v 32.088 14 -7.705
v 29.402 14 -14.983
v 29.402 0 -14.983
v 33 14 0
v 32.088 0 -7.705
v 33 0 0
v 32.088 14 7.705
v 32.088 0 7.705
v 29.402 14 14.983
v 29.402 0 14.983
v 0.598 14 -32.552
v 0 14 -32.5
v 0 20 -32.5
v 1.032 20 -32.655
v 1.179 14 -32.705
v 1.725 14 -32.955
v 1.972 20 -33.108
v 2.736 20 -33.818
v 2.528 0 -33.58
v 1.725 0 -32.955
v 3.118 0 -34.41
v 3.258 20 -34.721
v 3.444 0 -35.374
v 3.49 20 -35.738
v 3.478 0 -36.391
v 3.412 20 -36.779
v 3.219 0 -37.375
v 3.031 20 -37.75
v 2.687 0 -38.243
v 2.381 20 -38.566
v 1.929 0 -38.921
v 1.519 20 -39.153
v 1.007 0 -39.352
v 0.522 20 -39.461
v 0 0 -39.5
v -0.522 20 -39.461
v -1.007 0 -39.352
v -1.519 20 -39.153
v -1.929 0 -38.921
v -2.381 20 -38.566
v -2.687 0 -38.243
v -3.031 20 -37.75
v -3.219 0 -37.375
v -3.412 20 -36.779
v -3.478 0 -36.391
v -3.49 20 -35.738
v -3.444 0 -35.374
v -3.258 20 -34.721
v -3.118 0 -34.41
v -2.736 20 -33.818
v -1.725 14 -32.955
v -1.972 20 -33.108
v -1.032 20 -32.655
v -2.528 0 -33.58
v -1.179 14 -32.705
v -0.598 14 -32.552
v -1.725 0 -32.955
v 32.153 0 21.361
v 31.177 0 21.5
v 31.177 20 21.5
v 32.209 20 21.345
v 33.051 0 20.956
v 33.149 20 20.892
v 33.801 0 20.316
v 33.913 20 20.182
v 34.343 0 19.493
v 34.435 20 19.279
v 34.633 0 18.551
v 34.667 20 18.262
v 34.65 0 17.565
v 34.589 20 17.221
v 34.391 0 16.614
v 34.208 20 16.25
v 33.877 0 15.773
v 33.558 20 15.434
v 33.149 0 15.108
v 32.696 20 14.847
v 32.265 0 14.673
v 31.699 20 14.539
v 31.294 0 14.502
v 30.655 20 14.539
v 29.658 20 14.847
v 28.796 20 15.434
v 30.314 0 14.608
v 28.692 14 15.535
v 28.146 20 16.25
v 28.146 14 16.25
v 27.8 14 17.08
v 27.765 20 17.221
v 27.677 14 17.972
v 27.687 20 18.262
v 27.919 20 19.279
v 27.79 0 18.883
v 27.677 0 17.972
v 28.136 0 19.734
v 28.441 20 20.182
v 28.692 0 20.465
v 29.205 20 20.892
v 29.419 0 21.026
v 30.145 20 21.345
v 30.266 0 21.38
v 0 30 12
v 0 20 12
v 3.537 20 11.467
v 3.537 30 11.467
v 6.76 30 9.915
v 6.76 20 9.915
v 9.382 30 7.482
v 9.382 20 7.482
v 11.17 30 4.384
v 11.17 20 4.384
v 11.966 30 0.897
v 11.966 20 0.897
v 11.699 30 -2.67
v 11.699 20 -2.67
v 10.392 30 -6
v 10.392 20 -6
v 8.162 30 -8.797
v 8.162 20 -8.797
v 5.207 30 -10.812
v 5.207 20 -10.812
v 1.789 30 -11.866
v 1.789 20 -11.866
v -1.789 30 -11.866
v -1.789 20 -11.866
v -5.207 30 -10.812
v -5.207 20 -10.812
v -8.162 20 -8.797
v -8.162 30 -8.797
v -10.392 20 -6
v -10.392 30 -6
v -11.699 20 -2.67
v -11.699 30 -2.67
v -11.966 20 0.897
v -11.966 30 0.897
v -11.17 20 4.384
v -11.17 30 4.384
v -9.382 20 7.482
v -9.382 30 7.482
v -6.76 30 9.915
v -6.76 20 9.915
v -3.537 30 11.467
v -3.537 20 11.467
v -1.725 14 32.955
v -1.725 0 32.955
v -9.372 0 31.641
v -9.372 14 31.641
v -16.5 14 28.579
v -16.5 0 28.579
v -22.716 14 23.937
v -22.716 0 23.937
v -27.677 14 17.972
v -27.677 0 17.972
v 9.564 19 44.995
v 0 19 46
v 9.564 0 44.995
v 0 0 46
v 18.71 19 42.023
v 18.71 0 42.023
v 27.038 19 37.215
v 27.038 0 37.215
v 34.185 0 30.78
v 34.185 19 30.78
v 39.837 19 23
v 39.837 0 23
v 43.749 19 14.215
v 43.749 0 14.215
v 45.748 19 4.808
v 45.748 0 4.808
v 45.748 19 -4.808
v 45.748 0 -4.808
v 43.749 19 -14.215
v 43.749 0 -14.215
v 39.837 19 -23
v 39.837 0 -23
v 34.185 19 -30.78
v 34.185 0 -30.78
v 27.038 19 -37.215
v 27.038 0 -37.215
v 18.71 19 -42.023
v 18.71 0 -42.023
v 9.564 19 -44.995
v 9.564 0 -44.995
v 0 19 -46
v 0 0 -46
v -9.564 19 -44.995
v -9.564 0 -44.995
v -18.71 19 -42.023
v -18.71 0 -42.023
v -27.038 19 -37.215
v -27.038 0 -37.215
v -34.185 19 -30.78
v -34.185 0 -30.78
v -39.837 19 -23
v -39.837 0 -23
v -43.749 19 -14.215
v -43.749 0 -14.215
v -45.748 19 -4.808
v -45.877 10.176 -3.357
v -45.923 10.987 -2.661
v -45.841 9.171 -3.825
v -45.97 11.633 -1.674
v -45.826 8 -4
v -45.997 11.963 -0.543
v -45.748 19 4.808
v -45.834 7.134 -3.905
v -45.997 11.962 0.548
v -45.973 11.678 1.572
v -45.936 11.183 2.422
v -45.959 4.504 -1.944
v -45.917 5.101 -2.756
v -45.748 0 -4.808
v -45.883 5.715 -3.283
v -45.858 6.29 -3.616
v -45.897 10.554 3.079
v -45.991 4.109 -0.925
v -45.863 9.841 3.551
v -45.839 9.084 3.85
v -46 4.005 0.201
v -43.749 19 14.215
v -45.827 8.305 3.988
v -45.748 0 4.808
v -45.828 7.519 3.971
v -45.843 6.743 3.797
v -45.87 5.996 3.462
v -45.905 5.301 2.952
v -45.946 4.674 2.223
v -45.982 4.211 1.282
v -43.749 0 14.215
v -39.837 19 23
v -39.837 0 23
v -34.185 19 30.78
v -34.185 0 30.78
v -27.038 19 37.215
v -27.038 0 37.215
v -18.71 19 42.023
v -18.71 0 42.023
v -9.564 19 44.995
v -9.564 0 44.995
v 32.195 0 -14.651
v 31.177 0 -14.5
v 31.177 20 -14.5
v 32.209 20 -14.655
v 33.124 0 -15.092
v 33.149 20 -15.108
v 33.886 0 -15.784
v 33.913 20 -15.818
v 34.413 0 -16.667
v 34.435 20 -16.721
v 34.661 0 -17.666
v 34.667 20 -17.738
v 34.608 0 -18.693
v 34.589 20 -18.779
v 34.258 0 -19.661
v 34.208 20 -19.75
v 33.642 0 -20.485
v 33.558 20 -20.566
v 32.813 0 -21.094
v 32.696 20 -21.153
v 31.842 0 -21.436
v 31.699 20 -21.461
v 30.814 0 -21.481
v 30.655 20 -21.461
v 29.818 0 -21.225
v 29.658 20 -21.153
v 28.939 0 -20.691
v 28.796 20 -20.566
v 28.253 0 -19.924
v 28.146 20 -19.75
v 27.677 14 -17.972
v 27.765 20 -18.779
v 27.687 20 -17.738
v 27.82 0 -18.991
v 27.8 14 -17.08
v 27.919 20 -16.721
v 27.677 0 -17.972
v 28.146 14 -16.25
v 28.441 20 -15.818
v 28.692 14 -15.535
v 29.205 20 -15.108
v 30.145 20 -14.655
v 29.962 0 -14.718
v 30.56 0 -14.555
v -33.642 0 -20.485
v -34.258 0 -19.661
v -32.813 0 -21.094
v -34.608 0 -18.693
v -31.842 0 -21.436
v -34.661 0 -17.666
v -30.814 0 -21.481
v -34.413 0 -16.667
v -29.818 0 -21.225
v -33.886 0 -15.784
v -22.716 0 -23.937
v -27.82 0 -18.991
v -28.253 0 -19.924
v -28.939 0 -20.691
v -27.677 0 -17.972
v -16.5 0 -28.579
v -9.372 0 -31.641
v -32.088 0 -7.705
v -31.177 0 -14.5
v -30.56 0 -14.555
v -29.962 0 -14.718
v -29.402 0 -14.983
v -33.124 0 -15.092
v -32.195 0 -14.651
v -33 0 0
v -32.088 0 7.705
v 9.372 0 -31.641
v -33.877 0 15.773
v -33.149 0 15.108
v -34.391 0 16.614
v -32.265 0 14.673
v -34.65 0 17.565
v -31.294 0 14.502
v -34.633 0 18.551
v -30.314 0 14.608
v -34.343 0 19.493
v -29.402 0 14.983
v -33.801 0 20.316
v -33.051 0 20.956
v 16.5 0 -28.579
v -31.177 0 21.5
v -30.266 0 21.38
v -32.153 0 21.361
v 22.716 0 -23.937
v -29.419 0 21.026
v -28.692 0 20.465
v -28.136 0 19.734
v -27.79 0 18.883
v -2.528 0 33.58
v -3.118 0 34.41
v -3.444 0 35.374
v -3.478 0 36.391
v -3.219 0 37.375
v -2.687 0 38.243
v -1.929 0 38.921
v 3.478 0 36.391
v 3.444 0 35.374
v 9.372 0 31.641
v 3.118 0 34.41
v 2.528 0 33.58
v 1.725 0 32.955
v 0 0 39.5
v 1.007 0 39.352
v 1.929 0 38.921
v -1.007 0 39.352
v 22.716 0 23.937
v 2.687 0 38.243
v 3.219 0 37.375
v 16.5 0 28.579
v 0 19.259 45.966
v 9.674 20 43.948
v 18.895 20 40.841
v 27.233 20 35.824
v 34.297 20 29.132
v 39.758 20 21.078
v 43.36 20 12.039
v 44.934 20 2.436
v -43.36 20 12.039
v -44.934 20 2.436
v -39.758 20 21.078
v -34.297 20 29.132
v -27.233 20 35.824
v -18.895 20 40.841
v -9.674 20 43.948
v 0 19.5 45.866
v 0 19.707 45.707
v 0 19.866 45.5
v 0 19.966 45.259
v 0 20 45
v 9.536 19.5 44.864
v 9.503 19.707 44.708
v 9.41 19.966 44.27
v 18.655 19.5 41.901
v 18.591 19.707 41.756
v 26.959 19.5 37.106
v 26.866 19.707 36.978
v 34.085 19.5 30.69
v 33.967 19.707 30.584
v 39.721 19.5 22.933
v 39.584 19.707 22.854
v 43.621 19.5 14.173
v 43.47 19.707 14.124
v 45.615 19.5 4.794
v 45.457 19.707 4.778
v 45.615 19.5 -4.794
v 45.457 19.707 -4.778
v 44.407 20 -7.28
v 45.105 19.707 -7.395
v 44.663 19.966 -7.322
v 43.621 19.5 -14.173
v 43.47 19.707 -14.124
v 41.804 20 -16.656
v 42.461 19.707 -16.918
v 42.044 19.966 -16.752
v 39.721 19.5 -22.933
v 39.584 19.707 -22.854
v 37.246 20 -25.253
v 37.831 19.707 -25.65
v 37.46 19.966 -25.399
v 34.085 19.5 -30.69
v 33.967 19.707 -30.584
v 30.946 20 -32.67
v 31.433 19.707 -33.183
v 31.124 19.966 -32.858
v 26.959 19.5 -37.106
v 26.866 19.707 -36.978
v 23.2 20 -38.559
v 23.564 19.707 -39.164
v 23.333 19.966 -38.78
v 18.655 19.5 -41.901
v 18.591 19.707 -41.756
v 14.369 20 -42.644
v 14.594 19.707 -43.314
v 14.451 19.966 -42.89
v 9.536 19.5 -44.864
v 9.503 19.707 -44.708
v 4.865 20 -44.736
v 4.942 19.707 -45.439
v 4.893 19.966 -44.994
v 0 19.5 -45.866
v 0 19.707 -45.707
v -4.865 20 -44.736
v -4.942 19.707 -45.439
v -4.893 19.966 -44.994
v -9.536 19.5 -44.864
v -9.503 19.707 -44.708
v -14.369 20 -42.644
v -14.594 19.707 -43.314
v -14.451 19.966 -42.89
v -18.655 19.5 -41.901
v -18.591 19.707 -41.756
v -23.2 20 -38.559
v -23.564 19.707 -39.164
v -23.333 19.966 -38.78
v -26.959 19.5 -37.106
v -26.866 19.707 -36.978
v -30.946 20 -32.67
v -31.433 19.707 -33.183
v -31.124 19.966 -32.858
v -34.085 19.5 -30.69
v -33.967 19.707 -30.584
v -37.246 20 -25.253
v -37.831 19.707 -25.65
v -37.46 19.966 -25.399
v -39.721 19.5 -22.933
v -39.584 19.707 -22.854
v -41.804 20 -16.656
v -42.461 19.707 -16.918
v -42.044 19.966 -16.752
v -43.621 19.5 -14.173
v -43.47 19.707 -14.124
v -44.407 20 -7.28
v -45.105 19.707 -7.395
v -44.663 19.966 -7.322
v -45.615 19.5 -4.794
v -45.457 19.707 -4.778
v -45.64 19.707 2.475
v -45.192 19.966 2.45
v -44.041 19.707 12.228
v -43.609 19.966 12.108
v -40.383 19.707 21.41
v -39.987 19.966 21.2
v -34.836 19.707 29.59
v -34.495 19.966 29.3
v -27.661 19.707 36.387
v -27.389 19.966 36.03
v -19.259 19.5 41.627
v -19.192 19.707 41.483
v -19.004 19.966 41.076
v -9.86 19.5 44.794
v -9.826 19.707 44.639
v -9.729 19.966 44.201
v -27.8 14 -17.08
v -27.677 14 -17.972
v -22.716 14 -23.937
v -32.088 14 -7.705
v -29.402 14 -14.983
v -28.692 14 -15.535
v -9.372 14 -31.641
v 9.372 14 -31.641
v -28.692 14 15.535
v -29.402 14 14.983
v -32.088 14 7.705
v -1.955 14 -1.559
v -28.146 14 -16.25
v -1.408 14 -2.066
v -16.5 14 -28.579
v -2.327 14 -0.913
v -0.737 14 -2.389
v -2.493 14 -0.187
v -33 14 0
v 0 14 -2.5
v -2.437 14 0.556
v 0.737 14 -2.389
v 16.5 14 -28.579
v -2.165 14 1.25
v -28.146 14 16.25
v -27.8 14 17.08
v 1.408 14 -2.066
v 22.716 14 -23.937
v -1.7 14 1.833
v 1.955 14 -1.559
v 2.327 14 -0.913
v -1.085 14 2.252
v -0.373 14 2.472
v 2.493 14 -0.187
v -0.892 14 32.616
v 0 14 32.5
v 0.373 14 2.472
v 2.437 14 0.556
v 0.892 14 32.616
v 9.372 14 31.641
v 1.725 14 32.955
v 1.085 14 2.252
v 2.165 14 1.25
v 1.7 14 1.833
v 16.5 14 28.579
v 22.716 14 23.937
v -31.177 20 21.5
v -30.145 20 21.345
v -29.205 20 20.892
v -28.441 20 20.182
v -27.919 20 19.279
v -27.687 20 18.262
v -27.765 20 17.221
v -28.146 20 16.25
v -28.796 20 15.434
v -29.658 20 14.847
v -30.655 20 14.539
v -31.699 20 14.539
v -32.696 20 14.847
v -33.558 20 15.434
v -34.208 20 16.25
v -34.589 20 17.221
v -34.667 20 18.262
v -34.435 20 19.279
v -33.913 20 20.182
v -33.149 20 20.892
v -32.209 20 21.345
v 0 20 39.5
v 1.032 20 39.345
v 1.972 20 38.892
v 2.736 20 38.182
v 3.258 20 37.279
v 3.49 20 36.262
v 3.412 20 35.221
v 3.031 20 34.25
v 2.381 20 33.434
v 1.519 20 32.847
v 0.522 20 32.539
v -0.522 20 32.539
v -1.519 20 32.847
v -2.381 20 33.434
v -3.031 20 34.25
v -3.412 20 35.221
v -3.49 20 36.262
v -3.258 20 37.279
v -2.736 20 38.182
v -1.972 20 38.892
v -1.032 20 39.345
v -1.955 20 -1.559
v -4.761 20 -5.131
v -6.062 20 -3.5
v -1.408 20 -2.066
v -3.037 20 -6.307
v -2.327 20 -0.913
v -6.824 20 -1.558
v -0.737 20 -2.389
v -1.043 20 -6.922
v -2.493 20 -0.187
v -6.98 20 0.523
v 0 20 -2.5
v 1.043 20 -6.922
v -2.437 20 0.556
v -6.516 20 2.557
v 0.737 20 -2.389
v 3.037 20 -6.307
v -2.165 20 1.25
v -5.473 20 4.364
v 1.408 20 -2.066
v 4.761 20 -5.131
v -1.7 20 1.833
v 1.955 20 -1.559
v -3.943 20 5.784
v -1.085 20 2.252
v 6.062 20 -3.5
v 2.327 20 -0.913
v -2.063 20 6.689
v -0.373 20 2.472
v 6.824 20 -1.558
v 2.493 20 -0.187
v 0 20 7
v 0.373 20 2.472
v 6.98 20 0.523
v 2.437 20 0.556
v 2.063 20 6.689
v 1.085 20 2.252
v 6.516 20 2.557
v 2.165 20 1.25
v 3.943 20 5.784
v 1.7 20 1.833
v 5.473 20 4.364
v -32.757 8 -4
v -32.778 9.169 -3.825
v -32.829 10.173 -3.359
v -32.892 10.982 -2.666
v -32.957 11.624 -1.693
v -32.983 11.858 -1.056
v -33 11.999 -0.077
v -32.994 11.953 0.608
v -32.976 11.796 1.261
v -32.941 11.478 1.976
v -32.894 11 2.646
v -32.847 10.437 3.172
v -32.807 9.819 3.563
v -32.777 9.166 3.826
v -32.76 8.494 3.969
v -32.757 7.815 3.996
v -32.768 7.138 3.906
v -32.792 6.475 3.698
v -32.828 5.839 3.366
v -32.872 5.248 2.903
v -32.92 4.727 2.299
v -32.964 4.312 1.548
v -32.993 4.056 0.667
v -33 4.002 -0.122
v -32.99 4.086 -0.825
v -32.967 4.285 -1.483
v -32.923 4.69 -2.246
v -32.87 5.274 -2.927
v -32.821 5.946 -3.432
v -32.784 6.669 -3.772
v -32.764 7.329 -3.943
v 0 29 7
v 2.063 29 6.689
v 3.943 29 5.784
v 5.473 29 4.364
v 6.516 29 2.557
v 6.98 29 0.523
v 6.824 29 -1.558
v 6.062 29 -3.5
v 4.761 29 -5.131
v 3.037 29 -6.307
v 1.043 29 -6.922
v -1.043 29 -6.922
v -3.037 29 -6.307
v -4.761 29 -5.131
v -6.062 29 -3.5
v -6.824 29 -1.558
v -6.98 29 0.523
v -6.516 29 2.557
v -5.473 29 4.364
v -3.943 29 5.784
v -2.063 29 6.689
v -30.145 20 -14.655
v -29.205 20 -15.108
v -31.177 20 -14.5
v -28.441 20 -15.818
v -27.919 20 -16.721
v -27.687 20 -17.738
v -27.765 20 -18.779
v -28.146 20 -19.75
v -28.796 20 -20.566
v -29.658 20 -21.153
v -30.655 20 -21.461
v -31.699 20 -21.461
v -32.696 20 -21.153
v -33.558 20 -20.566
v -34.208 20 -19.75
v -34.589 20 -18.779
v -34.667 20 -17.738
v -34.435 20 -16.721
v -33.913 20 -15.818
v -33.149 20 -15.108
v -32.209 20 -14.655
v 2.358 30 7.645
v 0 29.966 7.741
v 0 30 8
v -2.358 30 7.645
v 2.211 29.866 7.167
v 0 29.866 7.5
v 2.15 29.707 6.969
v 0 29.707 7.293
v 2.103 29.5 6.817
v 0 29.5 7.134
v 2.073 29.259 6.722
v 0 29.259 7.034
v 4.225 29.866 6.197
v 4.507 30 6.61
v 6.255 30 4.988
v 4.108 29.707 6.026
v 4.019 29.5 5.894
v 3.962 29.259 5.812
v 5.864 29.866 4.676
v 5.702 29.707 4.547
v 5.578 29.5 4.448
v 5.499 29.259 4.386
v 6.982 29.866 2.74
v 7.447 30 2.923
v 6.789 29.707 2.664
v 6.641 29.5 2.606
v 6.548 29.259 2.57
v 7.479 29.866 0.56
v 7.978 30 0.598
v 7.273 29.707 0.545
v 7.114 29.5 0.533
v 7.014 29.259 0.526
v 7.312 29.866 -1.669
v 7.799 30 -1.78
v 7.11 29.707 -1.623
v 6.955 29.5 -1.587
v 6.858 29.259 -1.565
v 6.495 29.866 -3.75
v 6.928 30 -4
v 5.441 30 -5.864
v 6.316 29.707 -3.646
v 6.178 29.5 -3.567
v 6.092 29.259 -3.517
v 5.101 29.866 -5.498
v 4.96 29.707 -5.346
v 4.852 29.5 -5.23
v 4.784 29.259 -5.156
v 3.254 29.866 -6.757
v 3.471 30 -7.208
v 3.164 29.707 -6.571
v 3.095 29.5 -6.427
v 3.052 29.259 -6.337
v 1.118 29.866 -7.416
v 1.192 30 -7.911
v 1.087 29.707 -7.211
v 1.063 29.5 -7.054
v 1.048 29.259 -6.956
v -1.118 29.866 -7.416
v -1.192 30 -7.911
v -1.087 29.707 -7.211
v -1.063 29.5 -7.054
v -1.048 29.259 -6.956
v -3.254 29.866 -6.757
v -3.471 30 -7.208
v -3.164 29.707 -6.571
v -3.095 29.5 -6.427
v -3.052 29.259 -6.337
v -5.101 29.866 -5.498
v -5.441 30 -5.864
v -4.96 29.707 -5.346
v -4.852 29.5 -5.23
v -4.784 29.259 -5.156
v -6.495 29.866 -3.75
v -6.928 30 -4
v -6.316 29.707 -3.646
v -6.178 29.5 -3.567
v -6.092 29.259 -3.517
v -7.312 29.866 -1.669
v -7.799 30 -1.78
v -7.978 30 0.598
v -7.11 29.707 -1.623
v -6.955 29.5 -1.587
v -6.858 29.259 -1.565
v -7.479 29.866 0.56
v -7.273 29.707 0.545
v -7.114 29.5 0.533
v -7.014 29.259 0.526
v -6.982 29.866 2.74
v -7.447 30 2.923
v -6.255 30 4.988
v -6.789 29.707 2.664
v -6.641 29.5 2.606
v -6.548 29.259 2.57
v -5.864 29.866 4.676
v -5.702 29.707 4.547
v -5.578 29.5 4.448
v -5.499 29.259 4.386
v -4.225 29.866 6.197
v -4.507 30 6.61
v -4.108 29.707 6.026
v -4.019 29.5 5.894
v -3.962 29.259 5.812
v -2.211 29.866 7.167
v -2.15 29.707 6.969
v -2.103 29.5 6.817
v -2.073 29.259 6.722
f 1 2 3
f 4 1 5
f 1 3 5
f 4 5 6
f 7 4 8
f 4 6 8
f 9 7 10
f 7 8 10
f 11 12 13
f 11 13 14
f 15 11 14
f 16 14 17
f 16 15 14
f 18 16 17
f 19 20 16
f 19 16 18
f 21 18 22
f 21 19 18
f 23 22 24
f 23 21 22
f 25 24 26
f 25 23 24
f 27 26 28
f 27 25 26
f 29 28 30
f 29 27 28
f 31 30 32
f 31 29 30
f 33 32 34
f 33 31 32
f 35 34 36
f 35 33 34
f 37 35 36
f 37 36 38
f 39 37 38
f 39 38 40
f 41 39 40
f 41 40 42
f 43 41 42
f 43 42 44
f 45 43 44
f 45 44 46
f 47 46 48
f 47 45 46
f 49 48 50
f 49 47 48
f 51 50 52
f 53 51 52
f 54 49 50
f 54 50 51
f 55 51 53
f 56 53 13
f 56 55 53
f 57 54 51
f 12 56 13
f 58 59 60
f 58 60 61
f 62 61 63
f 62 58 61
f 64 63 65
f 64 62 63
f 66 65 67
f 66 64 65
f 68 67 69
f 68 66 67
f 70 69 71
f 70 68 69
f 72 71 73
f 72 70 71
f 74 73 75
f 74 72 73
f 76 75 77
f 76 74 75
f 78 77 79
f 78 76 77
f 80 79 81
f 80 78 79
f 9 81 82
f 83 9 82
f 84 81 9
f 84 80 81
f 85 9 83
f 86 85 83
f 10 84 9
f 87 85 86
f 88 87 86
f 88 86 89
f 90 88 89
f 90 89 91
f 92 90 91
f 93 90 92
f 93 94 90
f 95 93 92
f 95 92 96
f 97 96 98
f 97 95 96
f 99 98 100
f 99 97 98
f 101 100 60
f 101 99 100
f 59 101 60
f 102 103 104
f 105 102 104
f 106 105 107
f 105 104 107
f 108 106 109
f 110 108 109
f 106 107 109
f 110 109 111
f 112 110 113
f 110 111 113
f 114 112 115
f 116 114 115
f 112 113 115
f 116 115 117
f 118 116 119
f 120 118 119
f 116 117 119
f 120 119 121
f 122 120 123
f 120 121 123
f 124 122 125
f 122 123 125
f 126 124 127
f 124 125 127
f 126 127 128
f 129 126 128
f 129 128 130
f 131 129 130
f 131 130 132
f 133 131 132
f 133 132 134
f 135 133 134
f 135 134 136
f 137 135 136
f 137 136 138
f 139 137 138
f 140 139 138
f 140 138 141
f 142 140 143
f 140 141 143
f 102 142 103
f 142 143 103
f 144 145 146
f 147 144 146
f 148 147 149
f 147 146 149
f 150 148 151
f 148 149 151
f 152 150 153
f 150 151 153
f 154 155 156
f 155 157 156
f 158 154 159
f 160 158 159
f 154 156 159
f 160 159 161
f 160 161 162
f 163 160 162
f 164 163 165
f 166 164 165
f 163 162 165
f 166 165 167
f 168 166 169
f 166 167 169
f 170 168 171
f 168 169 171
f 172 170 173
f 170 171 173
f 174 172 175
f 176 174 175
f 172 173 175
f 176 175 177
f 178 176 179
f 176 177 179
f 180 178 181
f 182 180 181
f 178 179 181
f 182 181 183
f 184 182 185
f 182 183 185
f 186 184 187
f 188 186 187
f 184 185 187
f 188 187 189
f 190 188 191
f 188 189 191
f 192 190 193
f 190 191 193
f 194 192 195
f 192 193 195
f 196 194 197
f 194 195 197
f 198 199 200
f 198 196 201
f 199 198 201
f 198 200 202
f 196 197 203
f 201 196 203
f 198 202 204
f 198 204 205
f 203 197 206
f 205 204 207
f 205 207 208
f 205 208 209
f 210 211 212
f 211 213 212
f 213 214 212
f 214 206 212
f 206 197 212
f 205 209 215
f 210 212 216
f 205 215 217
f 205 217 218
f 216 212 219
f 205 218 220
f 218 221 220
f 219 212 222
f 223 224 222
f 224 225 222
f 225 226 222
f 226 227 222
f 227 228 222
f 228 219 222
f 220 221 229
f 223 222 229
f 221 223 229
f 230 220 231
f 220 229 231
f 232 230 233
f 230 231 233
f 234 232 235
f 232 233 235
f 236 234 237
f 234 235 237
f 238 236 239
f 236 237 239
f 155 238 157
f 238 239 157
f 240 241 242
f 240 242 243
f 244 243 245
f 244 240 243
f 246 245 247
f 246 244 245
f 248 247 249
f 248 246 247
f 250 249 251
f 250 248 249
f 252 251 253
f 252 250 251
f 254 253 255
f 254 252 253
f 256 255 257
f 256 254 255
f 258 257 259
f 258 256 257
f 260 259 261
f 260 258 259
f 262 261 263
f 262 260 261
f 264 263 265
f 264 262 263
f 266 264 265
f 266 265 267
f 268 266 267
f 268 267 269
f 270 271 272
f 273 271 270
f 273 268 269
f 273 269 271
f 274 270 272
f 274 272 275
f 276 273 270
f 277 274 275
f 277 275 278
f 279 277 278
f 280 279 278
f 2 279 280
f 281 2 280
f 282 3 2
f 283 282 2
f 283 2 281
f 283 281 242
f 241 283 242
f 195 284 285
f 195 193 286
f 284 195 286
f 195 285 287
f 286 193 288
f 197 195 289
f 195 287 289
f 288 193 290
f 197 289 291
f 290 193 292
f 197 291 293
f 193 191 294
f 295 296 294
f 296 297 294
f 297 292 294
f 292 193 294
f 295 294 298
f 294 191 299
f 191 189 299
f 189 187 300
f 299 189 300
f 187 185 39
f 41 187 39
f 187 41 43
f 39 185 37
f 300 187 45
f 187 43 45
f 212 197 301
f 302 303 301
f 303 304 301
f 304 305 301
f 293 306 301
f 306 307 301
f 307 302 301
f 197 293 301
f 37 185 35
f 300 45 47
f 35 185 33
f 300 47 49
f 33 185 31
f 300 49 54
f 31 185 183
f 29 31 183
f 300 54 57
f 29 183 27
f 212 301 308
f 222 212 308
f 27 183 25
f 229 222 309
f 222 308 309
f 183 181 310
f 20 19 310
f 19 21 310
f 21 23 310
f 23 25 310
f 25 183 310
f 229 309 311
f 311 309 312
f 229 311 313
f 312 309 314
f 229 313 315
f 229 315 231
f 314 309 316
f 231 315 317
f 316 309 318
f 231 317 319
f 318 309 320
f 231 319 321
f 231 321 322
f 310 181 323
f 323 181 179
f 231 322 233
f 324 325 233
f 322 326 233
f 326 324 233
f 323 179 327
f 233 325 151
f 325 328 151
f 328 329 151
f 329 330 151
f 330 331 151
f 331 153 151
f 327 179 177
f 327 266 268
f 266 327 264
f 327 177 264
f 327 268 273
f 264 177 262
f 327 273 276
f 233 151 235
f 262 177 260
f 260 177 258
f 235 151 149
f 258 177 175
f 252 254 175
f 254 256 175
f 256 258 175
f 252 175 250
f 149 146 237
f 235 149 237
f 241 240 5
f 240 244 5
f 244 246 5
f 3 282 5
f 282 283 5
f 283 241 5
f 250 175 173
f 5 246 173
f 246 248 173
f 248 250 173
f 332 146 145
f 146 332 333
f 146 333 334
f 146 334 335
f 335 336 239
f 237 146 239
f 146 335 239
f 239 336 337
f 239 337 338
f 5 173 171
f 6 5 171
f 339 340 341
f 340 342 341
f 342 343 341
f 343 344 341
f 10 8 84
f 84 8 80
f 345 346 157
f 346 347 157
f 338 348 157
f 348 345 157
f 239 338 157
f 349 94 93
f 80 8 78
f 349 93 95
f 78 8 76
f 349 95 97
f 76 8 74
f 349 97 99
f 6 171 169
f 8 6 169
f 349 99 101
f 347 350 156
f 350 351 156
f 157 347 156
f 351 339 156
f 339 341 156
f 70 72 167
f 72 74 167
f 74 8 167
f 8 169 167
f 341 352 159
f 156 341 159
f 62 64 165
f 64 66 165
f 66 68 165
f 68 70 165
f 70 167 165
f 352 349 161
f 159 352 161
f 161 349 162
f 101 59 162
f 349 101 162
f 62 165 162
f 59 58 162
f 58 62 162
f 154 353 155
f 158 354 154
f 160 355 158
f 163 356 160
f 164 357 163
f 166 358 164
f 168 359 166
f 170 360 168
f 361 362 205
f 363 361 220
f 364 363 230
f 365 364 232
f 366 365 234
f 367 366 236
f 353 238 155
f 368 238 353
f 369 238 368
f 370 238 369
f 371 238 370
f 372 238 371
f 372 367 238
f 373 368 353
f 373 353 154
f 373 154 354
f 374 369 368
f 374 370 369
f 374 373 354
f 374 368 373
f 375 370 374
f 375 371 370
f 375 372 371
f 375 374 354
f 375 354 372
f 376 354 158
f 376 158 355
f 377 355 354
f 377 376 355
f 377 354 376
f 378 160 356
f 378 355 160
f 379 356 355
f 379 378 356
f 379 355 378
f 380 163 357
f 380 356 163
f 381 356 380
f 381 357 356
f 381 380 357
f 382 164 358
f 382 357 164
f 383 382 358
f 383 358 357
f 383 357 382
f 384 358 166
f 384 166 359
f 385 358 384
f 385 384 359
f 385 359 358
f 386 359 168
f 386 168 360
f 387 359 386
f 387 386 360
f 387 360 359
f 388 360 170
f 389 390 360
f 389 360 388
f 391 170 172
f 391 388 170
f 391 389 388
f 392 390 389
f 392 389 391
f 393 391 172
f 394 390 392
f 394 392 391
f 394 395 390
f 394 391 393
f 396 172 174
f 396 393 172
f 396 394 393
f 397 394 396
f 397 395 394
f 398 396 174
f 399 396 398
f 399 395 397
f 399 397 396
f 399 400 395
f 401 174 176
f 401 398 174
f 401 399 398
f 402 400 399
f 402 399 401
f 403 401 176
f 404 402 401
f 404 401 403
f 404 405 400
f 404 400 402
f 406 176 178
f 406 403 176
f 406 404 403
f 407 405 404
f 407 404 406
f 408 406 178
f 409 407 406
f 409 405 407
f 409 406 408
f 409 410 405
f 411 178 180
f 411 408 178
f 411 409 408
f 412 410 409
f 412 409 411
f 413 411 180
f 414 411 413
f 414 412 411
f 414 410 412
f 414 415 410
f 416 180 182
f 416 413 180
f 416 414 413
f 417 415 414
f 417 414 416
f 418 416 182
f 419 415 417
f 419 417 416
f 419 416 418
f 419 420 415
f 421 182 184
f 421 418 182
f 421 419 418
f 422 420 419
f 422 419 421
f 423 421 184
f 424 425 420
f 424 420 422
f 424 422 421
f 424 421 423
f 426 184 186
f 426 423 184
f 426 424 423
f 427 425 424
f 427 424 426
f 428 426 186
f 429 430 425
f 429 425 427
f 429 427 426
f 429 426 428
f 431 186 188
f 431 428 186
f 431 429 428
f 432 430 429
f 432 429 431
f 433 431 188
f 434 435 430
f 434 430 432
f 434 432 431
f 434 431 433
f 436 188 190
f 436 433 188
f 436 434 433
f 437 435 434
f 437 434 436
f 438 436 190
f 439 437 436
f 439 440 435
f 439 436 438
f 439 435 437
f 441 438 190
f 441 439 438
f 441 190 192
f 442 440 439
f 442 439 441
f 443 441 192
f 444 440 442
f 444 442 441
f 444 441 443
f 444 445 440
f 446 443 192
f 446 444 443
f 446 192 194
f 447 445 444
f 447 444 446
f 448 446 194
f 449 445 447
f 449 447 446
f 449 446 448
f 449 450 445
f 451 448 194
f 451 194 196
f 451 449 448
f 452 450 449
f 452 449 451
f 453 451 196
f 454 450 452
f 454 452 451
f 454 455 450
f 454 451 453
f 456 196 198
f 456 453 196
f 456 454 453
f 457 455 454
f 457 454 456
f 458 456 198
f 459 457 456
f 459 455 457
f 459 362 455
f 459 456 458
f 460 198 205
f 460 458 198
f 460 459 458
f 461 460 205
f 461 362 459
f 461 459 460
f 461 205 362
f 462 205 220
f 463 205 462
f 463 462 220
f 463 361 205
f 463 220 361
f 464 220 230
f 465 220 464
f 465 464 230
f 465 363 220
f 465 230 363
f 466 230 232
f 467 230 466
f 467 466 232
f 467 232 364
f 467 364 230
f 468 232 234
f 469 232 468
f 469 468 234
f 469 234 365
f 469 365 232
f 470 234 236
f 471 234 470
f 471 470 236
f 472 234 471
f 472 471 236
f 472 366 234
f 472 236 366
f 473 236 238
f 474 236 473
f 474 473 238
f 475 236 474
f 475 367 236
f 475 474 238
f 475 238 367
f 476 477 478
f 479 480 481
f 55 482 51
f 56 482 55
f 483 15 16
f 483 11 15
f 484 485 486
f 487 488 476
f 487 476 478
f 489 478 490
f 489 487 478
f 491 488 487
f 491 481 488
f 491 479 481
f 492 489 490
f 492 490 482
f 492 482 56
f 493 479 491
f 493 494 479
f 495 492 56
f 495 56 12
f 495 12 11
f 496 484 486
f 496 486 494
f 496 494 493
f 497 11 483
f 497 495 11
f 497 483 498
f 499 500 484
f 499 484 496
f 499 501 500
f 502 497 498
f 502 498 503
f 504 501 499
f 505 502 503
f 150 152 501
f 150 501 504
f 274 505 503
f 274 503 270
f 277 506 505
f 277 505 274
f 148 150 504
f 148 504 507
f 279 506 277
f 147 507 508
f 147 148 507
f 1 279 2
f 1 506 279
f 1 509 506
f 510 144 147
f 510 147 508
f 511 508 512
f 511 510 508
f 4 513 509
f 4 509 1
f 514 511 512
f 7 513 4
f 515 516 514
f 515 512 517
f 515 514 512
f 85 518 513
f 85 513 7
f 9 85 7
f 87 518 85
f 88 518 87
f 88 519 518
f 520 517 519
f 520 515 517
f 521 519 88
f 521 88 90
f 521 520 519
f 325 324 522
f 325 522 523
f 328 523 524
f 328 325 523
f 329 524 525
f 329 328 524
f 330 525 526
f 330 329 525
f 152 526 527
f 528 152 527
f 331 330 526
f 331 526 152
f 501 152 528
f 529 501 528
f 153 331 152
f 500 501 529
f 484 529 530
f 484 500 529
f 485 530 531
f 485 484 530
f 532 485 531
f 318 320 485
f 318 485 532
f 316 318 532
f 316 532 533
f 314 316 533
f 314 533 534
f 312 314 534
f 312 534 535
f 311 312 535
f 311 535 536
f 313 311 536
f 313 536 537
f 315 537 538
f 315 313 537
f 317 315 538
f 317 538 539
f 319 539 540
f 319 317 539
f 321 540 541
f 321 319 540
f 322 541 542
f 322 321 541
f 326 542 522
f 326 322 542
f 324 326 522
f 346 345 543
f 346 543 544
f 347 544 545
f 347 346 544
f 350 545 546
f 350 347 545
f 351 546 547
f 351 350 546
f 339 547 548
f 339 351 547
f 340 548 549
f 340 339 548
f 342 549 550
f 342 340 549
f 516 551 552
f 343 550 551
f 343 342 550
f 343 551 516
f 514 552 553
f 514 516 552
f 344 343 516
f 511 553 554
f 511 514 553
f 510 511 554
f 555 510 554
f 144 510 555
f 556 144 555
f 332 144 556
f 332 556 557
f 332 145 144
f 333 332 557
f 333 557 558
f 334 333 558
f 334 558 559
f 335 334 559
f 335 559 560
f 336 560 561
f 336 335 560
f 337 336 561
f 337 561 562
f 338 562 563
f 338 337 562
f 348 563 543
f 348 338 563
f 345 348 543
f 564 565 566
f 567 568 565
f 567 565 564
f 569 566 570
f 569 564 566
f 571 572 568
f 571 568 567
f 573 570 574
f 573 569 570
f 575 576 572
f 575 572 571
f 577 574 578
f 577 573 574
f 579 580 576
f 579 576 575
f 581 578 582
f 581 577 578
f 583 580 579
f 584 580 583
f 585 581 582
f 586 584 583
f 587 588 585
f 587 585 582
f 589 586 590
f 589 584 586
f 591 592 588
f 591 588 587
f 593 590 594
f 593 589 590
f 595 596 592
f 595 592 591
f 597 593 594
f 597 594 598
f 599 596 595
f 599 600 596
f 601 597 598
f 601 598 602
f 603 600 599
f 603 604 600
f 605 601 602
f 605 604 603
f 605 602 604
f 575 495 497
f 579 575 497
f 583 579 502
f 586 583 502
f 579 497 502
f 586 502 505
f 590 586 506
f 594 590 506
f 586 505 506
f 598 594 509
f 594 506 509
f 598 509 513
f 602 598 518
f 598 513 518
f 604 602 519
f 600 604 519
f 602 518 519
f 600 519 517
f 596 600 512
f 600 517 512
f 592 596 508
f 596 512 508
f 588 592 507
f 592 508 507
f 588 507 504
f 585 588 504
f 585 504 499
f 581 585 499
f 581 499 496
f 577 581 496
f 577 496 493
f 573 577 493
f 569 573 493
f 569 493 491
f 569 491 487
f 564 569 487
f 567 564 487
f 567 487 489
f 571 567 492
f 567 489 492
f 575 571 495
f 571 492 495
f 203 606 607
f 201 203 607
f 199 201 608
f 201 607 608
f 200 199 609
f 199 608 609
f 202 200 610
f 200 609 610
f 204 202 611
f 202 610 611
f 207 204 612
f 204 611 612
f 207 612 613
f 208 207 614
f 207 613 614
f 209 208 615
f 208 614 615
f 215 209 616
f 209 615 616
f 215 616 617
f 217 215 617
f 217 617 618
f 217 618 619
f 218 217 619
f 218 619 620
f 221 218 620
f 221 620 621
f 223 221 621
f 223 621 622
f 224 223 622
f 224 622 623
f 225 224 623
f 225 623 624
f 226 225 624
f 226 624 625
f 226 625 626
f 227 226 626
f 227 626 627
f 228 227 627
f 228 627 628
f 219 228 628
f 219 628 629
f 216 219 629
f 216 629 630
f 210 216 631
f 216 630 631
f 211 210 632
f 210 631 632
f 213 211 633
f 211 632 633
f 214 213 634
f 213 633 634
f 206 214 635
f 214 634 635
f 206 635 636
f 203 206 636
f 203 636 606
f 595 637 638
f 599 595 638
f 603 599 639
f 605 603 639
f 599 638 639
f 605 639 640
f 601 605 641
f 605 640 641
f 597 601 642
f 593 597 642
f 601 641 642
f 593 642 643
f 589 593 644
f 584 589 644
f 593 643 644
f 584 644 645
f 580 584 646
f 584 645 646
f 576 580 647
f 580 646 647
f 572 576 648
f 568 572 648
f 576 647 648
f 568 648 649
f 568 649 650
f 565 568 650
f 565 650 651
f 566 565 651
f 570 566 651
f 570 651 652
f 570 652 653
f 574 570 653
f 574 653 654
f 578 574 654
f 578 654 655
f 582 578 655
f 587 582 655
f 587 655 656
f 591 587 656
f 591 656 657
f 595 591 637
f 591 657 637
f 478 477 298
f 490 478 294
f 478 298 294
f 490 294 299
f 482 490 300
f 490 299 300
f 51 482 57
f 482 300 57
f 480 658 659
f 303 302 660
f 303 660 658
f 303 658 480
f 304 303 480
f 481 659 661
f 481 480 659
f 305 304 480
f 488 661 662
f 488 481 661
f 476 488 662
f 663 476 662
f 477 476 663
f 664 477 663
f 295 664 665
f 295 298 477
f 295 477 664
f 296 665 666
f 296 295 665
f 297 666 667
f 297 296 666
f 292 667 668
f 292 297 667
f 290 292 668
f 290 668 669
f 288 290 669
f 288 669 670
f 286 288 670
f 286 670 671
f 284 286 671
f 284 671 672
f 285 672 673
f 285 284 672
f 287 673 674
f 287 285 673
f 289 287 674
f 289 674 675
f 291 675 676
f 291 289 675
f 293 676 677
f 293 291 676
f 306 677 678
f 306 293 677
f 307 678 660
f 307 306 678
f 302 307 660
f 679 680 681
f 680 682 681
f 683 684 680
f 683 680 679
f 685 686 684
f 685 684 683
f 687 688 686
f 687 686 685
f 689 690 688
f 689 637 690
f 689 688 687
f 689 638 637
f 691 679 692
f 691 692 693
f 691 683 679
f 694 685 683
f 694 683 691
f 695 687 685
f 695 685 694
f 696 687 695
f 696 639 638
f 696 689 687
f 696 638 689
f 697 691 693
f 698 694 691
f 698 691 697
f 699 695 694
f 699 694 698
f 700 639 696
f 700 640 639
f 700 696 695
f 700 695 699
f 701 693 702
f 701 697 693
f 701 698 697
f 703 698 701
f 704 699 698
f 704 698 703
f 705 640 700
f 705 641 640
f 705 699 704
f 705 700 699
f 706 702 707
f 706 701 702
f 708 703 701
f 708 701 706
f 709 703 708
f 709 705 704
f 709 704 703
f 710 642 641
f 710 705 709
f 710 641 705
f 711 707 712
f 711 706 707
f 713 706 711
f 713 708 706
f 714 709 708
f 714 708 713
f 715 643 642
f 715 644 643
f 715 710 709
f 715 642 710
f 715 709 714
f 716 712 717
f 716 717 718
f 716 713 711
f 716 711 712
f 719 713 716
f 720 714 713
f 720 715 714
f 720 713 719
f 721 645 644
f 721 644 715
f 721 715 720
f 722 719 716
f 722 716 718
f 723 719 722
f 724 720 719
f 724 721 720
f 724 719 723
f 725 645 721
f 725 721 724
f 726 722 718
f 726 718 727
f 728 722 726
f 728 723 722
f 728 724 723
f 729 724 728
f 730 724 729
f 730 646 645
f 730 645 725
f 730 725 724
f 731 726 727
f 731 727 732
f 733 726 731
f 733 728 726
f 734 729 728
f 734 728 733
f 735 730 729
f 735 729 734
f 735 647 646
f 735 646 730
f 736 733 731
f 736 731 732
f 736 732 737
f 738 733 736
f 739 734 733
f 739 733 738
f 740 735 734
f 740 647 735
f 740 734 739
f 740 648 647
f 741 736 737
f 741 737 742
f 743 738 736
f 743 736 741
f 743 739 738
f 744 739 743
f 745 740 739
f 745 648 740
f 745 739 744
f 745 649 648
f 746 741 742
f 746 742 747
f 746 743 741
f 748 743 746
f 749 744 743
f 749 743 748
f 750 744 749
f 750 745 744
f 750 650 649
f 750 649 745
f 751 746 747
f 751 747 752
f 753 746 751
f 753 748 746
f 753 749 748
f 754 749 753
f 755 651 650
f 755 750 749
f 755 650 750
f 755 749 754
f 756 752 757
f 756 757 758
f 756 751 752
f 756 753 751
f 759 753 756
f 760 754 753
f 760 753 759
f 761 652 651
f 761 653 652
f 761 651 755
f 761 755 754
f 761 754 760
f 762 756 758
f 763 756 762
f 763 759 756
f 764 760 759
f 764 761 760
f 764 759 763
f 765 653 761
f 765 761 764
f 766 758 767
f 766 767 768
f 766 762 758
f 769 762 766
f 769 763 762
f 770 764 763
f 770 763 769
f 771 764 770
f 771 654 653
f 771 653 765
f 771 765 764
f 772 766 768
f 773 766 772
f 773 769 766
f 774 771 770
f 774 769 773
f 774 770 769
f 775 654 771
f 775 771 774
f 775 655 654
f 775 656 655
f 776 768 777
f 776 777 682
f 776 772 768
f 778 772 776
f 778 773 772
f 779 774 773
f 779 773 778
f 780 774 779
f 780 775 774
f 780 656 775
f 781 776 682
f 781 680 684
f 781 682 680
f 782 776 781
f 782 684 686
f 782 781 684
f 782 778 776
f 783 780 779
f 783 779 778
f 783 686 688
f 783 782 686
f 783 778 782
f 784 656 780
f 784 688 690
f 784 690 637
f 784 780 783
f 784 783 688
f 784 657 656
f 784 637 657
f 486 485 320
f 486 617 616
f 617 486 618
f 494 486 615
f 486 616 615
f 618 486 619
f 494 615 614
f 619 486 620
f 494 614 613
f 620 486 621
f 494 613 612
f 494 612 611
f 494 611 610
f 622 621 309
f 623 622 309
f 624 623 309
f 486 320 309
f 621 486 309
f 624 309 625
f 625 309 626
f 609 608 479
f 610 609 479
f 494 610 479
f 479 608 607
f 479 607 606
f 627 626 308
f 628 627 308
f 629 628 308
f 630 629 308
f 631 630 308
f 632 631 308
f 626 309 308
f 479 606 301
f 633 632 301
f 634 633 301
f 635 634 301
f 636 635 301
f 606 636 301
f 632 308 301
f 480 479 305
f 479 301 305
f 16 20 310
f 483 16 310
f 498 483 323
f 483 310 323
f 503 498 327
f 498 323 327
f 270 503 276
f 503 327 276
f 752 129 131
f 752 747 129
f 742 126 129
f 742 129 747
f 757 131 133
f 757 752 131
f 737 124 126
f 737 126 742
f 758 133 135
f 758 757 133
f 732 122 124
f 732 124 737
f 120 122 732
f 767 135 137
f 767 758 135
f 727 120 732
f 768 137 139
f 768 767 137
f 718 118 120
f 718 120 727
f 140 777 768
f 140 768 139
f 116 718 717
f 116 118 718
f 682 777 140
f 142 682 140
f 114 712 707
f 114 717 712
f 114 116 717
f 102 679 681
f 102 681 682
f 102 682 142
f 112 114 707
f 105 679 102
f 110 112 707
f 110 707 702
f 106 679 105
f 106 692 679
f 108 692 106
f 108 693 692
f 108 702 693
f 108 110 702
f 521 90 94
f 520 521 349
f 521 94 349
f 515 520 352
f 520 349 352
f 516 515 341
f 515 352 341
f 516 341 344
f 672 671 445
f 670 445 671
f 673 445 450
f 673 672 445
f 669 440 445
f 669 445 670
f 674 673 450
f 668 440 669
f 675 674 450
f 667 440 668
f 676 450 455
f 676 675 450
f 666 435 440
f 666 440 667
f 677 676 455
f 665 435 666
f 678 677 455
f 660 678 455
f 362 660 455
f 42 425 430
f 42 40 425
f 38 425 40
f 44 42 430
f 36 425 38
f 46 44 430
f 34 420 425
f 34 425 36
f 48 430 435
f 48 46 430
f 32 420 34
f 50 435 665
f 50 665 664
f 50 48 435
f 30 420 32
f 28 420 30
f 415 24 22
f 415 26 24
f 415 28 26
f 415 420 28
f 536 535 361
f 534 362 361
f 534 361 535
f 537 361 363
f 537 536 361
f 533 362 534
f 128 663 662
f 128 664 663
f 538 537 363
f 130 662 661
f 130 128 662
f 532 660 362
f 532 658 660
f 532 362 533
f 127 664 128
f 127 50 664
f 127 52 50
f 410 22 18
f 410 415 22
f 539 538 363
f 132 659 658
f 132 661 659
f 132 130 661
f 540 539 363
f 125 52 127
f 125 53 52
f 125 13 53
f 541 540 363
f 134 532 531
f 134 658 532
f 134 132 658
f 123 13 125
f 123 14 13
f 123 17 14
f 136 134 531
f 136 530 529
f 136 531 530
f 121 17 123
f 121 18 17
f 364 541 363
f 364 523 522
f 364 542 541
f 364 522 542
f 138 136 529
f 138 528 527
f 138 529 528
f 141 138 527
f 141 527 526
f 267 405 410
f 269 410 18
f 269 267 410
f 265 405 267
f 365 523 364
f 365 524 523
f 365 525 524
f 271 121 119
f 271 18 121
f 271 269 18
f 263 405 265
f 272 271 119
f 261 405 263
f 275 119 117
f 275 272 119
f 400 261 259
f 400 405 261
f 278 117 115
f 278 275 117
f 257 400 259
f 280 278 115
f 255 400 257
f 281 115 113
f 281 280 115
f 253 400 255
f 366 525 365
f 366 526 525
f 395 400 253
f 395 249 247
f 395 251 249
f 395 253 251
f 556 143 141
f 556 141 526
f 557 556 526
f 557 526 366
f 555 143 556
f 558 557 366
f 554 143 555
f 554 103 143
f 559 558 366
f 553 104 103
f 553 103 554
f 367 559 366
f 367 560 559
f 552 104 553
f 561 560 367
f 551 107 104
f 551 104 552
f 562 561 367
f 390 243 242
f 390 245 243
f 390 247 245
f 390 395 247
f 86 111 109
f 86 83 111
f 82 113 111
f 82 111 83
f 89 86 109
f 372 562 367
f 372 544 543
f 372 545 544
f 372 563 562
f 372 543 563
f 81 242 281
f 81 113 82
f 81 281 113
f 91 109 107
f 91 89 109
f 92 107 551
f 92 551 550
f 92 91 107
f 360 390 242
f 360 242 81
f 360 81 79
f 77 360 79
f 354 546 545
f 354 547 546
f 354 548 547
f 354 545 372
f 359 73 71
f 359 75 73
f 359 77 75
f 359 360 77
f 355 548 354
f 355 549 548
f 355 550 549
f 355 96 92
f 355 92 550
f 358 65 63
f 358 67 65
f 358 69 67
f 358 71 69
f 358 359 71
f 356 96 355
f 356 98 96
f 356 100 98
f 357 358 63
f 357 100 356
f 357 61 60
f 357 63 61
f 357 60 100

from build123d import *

# Parameters (mm, degrees)
SKETCH1_R           = 46
SKETCH1_R_2         = 3.5
BOSS_EXTRUDE1_DEPTH = 20
FILLET1_R           = 1
SKETCH2_R           = 12
BOSS_EXTRUDE2_DEPTH = 10
SKETCH3_R           = 33
CUT_EXTRUDE1_DEPTH  = 14
SKETCH4_R           = 2.5
CUT_EXTRUDE2_DEPTH  = 6
SKETCH5_R           = 7
CUT_EXTRUDE3_DEPTH  = 10
FILLET2_R           = 1
SKETCH6_R           = 4
CUT_EXTRUDE4_DEPTH  = 54


with BuildPart() as part:
    # Sketch1 → Boss-Extrude1 (new body)
    with BuildSketch(Plane(origin=(0, 0, 0), x_dir=(1, 0, 0), z_dir=(0, 1, 0))):
        with Locations(Location((0, 0, 0), (0, 0, 270))):
            Circle(SKETCH1_R)
        with Locations(Location((0, 36, 0), (0, 0, 270))):
            Circle(SKETCH1_R_2, mode=Mode.SUBTRACT)
        with Locations(Location((31.176914536, 18, 0), (0, 0, 270))):
            Circle(SKETCH1_R_2, mode=Mode.SUBTRACT)
        with Locations(Location((31.176914536, -18, 0), (0, 0, 270))):
            Circle(SKETCH1_R_2, mode=Mode.SUBTRACT)
        with Locations(Location((0, -36, 0), (0, 0, 270))):
            Circle(SKETCH1_R_2, mode=Mode.SUBTRACT)
        with Locations(Location((-31.176914536, -18, 0), (0, 0, 270))):
            Circle(SKETCH1_R_2, mode=Mode.SUBTRACT)
        with Locations(Location((-31.176914536, 18, 0), (0, 0, 270))):
            Circle(SKETCH1_R_2, mode=Mode.SUBTRACT)
    extrude(amount=BOSS_EXTRUDE1_DEPTH)

    # Fillet1
    fillet1_edges = [part.edges().sort_by_distance(p)[0] for p in [
        (0, 20, -46),
    ]]
    fillet(fillet1_edges, radius=FILLET1_R)

    # Sketch2 → Boss-Extrude2 (add)
    with BuildSketch(Plane(origin=(0, 20, 0), x_dir=(1, 0, 0), z_dir=(0, 1, 0))):
        with Locations(Location((0, 0, 0), (0, 0, 270))):
            Circle(SKETCH2_R)
    extrude(amount=BOSS_EXTRUDE2_DEPTH)

    # Sketch3 → Cut-Extrude1 (cut)
    with BuildSketch(Plane.XZ):
        Circle(SKETCH3_R)
    extrude(amount=-CUT_EXTRUDE1_DEPTH, mode=Mode.SUBTRACT)

    # Sketch4 → Cut-Extrude2 (cut)
    with BuildSketch(Plane.XZ.offset(-14)):
        with Locations(Location((0, 0, 0), (0, 0, 270))):
            Circle(SKETCH4_R)
    extrude(amount=-CUT_EXTRUDE2_DEPTH, mode=Mode.SUBTRACT)

    # Sketch5 → Cut-Extrude3 (cut)
    with BuildSketch(Plane(origin=(0, 30, 0), x_dir=(1, 0, 0), z_dir=(0, 1, 0))):
        with Locations(Location((0, 0, 0), (0, 0, 270))):
            Circle(SKETCH5_R)
    extrude(amount=-CUT_EXTRUDE3_DEPTH, mode=Mode.SUBTRACT)

    # Fillet2
    fillet2_edges = [part.edges().sort_by_distance(p)[0] for p in [
        (0, 30, -7),
    ]]
    fillet(fillet2_edges, radius=FILLET2_R)

    # Sketch6 → Cut-Extrude4 (cut)
    with BuildSketch(Plane(origin=(0, 0, 0), x_dir=(0, 0, -1), z_dir=(1, 0, 0))):
        with Locations((0, 8)):
            Circle(SKETCH6_R)
    extrude(amount=-CUT_EXTRUDE4_DEPTH, mode=Mode.SUBTRACT)


solid = part.part
